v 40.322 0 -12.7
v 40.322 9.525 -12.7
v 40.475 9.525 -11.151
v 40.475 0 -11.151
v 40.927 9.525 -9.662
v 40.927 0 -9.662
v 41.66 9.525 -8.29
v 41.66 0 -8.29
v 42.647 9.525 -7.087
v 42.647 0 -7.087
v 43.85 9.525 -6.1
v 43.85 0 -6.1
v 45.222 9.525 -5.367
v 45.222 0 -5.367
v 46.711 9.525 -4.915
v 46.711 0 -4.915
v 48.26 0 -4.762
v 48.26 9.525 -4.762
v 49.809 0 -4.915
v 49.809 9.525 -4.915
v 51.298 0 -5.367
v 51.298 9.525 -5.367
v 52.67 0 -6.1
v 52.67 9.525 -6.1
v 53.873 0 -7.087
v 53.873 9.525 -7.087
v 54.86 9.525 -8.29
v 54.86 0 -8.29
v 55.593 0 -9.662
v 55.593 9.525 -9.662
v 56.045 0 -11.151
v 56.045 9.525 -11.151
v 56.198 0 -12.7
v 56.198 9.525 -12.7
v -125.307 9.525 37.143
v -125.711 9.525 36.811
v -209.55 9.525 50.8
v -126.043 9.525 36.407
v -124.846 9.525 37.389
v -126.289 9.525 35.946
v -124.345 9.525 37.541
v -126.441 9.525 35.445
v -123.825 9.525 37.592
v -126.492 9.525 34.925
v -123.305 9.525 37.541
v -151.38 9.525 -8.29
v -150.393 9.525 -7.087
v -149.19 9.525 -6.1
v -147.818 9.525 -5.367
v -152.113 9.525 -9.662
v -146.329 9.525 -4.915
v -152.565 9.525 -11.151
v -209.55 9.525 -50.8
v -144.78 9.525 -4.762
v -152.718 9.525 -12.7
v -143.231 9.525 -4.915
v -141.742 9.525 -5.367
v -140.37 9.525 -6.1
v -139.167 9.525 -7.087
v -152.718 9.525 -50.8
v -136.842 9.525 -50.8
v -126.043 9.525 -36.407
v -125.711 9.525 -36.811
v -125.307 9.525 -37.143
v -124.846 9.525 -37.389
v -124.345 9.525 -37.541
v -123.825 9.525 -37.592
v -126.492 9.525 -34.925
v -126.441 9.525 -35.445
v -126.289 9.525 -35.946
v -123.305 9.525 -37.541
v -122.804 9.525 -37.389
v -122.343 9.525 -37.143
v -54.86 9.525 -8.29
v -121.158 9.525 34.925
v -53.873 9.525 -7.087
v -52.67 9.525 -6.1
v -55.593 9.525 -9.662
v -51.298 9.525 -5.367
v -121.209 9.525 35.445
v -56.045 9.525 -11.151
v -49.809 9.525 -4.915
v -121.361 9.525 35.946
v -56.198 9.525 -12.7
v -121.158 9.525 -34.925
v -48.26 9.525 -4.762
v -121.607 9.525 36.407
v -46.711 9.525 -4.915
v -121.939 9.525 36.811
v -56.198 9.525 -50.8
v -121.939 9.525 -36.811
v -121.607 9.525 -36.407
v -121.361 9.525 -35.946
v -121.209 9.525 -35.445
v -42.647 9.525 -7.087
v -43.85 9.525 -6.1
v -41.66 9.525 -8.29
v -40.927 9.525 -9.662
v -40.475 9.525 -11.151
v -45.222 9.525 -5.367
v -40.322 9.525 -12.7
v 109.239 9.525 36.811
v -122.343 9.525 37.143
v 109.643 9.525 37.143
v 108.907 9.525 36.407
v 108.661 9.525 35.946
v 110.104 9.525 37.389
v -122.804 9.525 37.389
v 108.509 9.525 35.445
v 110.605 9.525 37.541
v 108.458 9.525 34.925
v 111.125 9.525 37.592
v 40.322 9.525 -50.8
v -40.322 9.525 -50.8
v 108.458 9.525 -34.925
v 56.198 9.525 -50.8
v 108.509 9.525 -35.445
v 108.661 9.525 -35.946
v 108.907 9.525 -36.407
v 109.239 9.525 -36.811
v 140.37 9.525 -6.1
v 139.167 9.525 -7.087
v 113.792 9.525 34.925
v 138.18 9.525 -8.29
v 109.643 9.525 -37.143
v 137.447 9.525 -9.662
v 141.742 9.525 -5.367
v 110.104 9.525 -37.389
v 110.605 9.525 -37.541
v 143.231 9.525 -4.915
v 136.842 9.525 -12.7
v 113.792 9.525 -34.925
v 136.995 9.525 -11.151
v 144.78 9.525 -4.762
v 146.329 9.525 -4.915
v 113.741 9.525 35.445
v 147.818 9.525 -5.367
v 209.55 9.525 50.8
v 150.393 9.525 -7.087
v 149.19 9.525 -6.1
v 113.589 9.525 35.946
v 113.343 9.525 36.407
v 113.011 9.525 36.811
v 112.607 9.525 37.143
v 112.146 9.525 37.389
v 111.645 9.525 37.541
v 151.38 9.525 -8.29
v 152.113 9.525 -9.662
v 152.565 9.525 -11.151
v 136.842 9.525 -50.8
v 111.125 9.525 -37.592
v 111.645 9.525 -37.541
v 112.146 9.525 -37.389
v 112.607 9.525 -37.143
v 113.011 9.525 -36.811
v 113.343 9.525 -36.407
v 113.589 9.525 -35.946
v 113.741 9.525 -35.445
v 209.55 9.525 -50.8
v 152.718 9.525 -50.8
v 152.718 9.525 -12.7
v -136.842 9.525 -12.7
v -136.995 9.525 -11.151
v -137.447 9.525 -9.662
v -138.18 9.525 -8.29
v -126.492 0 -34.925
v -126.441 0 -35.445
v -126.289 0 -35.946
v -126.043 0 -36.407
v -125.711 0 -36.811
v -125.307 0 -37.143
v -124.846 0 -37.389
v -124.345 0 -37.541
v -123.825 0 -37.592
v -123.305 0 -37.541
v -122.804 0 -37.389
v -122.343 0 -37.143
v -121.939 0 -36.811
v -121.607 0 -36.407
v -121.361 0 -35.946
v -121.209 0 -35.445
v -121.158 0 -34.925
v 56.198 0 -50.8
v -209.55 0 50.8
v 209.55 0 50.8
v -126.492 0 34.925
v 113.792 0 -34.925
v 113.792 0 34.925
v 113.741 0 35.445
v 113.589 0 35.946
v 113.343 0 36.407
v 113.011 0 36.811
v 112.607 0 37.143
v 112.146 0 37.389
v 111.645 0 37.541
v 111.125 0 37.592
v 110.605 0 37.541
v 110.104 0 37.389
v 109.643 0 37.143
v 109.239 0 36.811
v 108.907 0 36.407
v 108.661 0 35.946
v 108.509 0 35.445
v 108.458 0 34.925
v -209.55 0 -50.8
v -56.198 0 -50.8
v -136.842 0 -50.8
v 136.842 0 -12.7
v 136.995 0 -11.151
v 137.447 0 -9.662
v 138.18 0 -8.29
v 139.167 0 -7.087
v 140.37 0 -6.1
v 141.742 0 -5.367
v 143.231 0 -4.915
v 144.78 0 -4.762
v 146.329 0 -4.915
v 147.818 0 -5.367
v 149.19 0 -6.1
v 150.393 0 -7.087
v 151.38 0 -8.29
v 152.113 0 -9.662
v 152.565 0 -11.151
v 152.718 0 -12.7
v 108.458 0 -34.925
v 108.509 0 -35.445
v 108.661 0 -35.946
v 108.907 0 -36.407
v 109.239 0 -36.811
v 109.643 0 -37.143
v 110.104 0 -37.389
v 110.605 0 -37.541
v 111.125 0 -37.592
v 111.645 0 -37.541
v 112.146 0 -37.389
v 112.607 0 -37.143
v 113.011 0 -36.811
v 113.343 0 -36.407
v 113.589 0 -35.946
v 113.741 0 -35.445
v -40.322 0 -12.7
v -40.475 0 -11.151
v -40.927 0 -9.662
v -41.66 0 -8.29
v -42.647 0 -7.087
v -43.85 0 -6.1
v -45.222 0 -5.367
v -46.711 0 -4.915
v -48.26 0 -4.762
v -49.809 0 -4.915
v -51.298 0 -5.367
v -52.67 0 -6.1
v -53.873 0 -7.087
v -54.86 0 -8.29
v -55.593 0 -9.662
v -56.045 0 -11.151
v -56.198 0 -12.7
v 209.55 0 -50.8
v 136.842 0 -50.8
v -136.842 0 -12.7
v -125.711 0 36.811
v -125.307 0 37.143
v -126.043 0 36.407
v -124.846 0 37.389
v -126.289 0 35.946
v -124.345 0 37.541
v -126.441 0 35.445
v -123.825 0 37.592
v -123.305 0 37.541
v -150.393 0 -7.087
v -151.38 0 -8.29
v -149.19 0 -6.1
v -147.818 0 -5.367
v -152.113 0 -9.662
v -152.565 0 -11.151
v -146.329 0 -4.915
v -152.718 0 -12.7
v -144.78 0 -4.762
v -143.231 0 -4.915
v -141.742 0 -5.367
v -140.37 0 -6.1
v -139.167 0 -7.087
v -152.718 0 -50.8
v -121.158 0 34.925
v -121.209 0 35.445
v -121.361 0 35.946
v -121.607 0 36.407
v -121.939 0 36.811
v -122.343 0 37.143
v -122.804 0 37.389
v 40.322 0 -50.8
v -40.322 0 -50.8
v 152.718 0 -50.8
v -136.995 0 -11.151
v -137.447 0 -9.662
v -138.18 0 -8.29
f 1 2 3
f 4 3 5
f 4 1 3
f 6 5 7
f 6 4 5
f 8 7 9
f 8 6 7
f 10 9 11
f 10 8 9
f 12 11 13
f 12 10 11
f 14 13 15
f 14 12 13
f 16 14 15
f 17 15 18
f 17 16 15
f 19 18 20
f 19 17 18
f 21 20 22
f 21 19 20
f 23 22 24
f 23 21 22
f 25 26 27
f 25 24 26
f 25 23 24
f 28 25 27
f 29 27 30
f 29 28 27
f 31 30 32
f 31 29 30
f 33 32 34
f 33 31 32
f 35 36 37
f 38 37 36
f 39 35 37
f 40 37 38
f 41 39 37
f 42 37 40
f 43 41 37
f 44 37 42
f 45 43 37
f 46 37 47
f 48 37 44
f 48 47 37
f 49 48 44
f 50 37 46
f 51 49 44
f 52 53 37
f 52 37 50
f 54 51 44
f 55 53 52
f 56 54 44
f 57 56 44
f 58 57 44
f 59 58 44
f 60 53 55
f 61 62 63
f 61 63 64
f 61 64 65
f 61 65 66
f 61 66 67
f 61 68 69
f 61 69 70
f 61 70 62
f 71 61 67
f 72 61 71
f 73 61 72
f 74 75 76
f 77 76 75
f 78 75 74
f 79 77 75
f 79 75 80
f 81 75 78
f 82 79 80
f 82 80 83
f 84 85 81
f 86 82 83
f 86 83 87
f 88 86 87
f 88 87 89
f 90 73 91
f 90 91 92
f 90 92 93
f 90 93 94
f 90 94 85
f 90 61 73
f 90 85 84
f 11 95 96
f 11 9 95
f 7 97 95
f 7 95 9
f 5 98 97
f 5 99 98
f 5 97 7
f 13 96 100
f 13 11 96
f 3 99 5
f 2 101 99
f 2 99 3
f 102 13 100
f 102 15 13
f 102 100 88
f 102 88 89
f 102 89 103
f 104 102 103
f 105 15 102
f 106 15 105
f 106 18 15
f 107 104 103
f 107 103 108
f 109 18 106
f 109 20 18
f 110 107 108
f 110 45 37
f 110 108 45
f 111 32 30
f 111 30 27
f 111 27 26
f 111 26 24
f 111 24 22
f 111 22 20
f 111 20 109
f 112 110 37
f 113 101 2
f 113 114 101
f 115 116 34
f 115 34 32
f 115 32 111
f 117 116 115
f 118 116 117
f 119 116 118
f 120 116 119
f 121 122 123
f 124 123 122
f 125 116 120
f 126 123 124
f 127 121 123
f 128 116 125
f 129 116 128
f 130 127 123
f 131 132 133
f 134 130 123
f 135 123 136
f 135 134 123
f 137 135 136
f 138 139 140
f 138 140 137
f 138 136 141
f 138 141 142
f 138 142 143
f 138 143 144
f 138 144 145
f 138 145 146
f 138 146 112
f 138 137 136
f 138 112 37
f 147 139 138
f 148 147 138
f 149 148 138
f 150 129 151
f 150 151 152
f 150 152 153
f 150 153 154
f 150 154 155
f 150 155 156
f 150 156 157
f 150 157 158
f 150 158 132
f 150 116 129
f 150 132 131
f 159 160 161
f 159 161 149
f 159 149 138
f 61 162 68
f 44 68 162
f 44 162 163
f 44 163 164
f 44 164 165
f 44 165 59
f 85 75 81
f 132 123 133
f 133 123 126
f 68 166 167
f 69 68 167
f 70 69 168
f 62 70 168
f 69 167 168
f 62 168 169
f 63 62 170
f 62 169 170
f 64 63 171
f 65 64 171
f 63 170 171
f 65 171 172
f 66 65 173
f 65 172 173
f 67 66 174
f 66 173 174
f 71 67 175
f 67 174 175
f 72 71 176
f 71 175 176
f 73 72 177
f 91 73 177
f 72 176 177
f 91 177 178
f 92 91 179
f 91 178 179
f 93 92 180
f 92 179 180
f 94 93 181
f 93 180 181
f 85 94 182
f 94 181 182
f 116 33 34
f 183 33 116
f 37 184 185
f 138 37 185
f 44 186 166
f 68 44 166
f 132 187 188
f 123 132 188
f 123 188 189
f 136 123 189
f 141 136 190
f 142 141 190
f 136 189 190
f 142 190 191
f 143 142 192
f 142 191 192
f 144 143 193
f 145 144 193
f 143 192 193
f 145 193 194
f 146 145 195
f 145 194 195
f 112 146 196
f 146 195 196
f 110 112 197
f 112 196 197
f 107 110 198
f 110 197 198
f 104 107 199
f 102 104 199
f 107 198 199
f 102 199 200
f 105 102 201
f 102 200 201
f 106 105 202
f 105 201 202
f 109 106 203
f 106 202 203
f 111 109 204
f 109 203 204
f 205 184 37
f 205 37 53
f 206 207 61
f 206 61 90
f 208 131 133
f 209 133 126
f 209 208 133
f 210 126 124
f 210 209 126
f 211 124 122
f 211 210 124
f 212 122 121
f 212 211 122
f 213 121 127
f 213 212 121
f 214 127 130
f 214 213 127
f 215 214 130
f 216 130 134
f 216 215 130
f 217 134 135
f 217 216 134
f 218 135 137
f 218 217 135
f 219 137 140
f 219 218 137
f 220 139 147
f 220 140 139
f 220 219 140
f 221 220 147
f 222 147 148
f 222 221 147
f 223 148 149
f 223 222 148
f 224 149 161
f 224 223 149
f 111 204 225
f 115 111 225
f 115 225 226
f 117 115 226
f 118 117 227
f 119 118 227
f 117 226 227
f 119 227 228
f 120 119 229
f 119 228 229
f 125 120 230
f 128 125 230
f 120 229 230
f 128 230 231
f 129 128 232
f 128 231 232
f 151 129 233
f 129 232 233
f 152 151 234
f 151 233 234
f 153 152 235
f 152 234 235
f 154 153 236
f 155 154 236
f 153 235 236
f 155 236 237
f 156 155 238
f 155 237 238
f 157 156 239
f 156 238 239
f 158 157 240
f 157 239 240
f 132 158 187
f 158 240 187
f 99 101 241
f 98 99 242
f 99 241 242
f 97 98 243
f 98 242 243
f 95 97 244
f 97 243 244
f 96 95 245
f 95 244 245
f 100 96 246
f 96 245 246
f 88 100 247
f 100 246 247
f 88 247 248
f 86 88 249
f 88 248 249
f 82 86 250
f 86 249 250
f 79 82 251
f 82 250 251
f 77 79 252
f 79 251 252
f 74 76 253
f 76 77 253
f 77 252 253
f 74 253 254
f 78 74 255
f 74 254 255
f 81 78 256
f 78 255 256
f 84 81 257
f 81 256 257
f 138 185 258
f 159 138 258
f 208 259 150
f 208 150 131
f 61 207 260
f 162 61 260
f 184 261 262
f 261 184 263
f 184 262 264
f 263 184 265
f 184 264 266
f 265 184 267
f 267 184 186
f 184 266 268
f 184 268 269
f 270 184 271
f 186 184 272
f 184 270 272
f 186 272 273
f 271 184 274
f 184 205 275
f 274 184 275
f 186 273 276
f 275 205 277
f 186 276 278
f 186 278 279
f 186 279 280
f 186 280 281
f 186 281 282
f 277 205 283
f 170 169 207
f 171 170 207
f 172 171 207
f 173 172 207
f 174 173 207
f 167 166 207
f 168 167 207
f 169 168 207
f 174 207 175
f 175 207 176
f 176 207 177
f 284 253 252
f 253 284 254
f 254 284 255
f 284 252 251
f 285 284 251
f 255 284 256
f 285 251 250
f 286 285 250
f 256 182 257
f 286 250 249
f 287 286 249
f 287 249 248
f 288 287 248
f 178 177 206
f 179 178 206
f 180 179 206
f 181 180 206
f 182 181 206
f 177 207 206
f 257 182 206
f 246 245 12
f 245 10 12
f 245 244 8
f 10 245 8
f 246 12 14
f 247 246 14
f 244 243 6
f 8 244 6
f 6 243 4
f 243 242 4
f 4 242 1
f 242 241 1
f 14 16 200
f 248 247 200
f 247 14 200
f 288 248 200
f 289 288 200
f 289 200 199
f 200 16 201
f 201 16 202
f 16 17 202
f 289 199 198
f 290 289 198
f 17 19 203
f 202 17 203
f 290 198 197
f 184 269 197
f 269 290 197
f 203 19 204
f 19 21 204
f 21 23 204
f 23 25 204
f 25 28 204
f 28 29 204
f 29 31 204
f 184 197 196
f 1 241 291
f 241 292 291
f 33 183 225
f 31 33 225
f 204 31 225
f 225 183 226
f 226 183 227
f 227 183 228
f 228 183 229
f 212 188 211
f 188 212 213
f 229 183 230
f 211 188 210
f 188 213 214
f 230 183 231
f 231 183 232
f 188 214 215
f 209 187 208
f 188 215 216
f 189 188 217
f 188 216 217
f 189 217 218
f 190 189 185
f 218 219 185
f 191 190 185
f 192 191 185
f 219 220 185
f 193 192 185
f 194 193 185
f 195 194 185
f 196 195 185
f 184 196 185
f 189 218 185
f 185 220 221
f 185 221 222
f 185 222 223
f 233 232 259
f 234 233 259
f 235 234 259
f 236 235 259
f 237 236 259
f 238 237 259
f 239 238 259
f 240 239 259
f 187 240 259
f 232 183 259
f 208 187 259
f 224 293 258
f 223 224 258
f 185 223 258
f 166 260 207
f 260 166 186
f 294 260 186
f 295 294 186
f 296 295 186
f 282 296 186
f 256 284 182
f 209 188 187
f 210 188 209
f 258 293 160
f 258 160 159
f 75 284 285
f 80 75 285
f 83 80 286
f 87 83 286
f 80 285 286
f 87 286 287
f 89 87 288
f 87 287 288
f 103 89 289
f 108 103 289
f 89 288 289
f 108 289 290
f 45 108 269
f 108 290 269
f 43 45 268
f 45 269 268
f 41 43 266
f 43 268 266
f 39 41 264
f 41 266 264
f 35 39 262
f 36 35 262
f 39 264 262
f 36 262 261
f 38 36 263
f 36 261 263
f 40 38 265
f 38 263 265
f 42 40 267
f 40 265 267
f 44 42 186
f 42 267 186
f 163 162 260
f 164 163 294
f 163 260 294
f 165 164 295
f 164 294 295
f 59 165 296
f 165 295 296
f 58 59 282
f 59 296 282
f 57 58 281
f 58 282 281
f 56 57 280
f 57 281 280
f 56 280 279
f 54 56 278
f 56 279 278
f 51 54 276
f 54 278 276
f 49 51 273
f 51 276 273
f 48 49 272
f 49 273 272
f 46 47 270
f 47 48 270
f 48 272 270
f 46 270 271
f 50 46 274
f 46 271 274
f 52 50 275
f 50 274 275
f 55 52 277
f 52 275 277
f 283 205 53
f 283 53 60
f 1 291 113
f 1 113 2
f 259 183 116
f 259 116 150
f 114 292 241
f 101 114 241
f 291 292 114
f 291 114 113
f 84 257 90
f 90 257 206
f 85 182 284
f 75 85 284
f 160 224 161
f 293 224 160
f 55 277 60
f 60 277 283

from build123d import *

# Parameters (mm, degrees)
SKETCH50_W          = 419.1
SKETCH50_H          = 101.6
BOSS_EXTRUDE4_DEPTH = 9.525
CUT_EXTRUDE7_REACH  = 217.83
CUT_EXTRUDE8_REACH  = 217.83


with BuildPart() as part:
    # Sketch50 → Boss-Extrude4 (new body)
    with BuildSketch(Plane(origin=(0, 0, 0), x_dir=(1, 0, 0), z_dir=(0, 1, 0))):
        Rectangle(SKETCH50_W, SKETCH50_H)
    extrude(amount=BOSS_EXTRUDE4_DEPTH)

    # Sketch51 → Cut-Extrude7 (cut, up to next)
    with BuildSketch(Plane.XZ, mode=Mode.PRIVATE) as cut_extrude7_sk1:
        with BuildLine():
            Line((152.7175, -12.7), (152.7175, -50.8))
            ThreePointArc((152.7175, -50.8), (144.78, -58.7375), (136.8425, -50.8))
            Line((136.8425, -50.8), (136.8425, -12.7))
            ThreePointArc((136.8425, -12.7), (144.78, -4.7625), (152.7175, -12.7))
        make_face()
    cut_extrude7_tool1 = extrude(cut_extrude7_sk1.sketch, amount=-CUT_EXTRUDE7_REACH, mode=Mode.PRIVATE) & part.part
    # Sketch51 → Cut-Extrude7 (cut, up to next)
    with BuildSketch(Plane.XZ, mode=Mode.PRIVATE) as cut_extrude7_sk2:
        with BuildLine():
            Line((40.3225, -50.8), (40.3225, -12.7))
            ThreePointArc((40.3225, -12.7), (48.26, -4.7625), (56.1975, -12.7))
            Line((56.1975, -12.7), (56.1975, -50.8))
            ThreePointArc((56.1975, -50.8), (48.26, -58.7375), (40.3225, -50.8))
        make_face()
    cut_extrude7_tool2 = extrude(cut_extrude7_sk2.sketch, amount=-CUT_EXTRUDE7_REACH, mode=Mode.PRIVATE) & part.part
    cut_extrude7_1 = cut_extrude7_tool1.solids().sort_by_distance((144.78, 0, -31.75))[0]
    add(cut_extrude7_1, mode=Mode.SUBTRACT)
    cut_extrude7_2 = cut_extrude7_tool2.solids().sort_by_distance((48.26, 0, -31.75))[0]
    add(cut_extrude7_2, mode=Mode.SUBTRACT)
    cut_extrude7 = cut_extrude7_1 + cut_extrude7_2  # Cut-Extrude7 as one shape, for the pattern or mirror that repeats it

    # Mirror4: Cut-Extrude7 across plane
    add(cut_extrude7.mirror(Plane(origin=(0, 0, 0), x_dir=(0, 0, 1), z_dir=(1, 0, 0))), mode=Mode.SUBTRACT)

    # Sketch55 → Cut-Extrude8 (cut, up to next)
    with BuildSketch(Plane.XZ, mode=Mode.PRIVATE) as cut_extrude8_sk1:
        with BuildLine():
            Line((-126.492, 34.925), (-126.492, -34.925))
            ThreePointArc((-126.492, -34.925), (-123.825, -37.592), (-121.158, -34.925))
            Line((-121.158, -34.925), (-121.158, 34.925))
            ThreePointArc((-121.158, 34.925), (-123.825, 37.592), (-126.492, 34.925))
        make_face()
    cut_extrude8_tool1 = extrude(cut_extrude8_sk1.sketch, amount=-CUT_EXTRUDE8_REACH, mode=Mode.PRIVATE) & part.part
    # Sketch55 → Cut-Extrude8 (cut, up to next)
    with BuildSketch(Plane.XZ, mode=Mode.PRIVATE) as cut_extrude8_sk2:
        with BuildLine():
            Line((108.458, 34.925), (108.458, -34.925))
            ThreePointArc((108.458, -34.925), (111.125, -37.592), (113.792, -34.925))
            Line((113.792, -34.925), (113.792, 34.925))
            ThreePointArc((113.792, 34.925), (111.125, 37.592), (108.458, 34.925))
        make_face()
    cut_extrude8_tool2 = extrude(cut_extrude8_sk2.sketch, amount=-CUT_EXTRUDE8_REACH, mode=Mode.PRIVATE) & part.part
    add(cut_extrude8_tool1.solids().sort_by_distance((-123.825, 0, 0))[0], mode=Mode.SUBTRACT)
    add(cut_extrude8_tool2.solids().sort_by_distance((111.125, 0, 0))[0], mode=Mode.SUBTRACT)


solid = part.part
